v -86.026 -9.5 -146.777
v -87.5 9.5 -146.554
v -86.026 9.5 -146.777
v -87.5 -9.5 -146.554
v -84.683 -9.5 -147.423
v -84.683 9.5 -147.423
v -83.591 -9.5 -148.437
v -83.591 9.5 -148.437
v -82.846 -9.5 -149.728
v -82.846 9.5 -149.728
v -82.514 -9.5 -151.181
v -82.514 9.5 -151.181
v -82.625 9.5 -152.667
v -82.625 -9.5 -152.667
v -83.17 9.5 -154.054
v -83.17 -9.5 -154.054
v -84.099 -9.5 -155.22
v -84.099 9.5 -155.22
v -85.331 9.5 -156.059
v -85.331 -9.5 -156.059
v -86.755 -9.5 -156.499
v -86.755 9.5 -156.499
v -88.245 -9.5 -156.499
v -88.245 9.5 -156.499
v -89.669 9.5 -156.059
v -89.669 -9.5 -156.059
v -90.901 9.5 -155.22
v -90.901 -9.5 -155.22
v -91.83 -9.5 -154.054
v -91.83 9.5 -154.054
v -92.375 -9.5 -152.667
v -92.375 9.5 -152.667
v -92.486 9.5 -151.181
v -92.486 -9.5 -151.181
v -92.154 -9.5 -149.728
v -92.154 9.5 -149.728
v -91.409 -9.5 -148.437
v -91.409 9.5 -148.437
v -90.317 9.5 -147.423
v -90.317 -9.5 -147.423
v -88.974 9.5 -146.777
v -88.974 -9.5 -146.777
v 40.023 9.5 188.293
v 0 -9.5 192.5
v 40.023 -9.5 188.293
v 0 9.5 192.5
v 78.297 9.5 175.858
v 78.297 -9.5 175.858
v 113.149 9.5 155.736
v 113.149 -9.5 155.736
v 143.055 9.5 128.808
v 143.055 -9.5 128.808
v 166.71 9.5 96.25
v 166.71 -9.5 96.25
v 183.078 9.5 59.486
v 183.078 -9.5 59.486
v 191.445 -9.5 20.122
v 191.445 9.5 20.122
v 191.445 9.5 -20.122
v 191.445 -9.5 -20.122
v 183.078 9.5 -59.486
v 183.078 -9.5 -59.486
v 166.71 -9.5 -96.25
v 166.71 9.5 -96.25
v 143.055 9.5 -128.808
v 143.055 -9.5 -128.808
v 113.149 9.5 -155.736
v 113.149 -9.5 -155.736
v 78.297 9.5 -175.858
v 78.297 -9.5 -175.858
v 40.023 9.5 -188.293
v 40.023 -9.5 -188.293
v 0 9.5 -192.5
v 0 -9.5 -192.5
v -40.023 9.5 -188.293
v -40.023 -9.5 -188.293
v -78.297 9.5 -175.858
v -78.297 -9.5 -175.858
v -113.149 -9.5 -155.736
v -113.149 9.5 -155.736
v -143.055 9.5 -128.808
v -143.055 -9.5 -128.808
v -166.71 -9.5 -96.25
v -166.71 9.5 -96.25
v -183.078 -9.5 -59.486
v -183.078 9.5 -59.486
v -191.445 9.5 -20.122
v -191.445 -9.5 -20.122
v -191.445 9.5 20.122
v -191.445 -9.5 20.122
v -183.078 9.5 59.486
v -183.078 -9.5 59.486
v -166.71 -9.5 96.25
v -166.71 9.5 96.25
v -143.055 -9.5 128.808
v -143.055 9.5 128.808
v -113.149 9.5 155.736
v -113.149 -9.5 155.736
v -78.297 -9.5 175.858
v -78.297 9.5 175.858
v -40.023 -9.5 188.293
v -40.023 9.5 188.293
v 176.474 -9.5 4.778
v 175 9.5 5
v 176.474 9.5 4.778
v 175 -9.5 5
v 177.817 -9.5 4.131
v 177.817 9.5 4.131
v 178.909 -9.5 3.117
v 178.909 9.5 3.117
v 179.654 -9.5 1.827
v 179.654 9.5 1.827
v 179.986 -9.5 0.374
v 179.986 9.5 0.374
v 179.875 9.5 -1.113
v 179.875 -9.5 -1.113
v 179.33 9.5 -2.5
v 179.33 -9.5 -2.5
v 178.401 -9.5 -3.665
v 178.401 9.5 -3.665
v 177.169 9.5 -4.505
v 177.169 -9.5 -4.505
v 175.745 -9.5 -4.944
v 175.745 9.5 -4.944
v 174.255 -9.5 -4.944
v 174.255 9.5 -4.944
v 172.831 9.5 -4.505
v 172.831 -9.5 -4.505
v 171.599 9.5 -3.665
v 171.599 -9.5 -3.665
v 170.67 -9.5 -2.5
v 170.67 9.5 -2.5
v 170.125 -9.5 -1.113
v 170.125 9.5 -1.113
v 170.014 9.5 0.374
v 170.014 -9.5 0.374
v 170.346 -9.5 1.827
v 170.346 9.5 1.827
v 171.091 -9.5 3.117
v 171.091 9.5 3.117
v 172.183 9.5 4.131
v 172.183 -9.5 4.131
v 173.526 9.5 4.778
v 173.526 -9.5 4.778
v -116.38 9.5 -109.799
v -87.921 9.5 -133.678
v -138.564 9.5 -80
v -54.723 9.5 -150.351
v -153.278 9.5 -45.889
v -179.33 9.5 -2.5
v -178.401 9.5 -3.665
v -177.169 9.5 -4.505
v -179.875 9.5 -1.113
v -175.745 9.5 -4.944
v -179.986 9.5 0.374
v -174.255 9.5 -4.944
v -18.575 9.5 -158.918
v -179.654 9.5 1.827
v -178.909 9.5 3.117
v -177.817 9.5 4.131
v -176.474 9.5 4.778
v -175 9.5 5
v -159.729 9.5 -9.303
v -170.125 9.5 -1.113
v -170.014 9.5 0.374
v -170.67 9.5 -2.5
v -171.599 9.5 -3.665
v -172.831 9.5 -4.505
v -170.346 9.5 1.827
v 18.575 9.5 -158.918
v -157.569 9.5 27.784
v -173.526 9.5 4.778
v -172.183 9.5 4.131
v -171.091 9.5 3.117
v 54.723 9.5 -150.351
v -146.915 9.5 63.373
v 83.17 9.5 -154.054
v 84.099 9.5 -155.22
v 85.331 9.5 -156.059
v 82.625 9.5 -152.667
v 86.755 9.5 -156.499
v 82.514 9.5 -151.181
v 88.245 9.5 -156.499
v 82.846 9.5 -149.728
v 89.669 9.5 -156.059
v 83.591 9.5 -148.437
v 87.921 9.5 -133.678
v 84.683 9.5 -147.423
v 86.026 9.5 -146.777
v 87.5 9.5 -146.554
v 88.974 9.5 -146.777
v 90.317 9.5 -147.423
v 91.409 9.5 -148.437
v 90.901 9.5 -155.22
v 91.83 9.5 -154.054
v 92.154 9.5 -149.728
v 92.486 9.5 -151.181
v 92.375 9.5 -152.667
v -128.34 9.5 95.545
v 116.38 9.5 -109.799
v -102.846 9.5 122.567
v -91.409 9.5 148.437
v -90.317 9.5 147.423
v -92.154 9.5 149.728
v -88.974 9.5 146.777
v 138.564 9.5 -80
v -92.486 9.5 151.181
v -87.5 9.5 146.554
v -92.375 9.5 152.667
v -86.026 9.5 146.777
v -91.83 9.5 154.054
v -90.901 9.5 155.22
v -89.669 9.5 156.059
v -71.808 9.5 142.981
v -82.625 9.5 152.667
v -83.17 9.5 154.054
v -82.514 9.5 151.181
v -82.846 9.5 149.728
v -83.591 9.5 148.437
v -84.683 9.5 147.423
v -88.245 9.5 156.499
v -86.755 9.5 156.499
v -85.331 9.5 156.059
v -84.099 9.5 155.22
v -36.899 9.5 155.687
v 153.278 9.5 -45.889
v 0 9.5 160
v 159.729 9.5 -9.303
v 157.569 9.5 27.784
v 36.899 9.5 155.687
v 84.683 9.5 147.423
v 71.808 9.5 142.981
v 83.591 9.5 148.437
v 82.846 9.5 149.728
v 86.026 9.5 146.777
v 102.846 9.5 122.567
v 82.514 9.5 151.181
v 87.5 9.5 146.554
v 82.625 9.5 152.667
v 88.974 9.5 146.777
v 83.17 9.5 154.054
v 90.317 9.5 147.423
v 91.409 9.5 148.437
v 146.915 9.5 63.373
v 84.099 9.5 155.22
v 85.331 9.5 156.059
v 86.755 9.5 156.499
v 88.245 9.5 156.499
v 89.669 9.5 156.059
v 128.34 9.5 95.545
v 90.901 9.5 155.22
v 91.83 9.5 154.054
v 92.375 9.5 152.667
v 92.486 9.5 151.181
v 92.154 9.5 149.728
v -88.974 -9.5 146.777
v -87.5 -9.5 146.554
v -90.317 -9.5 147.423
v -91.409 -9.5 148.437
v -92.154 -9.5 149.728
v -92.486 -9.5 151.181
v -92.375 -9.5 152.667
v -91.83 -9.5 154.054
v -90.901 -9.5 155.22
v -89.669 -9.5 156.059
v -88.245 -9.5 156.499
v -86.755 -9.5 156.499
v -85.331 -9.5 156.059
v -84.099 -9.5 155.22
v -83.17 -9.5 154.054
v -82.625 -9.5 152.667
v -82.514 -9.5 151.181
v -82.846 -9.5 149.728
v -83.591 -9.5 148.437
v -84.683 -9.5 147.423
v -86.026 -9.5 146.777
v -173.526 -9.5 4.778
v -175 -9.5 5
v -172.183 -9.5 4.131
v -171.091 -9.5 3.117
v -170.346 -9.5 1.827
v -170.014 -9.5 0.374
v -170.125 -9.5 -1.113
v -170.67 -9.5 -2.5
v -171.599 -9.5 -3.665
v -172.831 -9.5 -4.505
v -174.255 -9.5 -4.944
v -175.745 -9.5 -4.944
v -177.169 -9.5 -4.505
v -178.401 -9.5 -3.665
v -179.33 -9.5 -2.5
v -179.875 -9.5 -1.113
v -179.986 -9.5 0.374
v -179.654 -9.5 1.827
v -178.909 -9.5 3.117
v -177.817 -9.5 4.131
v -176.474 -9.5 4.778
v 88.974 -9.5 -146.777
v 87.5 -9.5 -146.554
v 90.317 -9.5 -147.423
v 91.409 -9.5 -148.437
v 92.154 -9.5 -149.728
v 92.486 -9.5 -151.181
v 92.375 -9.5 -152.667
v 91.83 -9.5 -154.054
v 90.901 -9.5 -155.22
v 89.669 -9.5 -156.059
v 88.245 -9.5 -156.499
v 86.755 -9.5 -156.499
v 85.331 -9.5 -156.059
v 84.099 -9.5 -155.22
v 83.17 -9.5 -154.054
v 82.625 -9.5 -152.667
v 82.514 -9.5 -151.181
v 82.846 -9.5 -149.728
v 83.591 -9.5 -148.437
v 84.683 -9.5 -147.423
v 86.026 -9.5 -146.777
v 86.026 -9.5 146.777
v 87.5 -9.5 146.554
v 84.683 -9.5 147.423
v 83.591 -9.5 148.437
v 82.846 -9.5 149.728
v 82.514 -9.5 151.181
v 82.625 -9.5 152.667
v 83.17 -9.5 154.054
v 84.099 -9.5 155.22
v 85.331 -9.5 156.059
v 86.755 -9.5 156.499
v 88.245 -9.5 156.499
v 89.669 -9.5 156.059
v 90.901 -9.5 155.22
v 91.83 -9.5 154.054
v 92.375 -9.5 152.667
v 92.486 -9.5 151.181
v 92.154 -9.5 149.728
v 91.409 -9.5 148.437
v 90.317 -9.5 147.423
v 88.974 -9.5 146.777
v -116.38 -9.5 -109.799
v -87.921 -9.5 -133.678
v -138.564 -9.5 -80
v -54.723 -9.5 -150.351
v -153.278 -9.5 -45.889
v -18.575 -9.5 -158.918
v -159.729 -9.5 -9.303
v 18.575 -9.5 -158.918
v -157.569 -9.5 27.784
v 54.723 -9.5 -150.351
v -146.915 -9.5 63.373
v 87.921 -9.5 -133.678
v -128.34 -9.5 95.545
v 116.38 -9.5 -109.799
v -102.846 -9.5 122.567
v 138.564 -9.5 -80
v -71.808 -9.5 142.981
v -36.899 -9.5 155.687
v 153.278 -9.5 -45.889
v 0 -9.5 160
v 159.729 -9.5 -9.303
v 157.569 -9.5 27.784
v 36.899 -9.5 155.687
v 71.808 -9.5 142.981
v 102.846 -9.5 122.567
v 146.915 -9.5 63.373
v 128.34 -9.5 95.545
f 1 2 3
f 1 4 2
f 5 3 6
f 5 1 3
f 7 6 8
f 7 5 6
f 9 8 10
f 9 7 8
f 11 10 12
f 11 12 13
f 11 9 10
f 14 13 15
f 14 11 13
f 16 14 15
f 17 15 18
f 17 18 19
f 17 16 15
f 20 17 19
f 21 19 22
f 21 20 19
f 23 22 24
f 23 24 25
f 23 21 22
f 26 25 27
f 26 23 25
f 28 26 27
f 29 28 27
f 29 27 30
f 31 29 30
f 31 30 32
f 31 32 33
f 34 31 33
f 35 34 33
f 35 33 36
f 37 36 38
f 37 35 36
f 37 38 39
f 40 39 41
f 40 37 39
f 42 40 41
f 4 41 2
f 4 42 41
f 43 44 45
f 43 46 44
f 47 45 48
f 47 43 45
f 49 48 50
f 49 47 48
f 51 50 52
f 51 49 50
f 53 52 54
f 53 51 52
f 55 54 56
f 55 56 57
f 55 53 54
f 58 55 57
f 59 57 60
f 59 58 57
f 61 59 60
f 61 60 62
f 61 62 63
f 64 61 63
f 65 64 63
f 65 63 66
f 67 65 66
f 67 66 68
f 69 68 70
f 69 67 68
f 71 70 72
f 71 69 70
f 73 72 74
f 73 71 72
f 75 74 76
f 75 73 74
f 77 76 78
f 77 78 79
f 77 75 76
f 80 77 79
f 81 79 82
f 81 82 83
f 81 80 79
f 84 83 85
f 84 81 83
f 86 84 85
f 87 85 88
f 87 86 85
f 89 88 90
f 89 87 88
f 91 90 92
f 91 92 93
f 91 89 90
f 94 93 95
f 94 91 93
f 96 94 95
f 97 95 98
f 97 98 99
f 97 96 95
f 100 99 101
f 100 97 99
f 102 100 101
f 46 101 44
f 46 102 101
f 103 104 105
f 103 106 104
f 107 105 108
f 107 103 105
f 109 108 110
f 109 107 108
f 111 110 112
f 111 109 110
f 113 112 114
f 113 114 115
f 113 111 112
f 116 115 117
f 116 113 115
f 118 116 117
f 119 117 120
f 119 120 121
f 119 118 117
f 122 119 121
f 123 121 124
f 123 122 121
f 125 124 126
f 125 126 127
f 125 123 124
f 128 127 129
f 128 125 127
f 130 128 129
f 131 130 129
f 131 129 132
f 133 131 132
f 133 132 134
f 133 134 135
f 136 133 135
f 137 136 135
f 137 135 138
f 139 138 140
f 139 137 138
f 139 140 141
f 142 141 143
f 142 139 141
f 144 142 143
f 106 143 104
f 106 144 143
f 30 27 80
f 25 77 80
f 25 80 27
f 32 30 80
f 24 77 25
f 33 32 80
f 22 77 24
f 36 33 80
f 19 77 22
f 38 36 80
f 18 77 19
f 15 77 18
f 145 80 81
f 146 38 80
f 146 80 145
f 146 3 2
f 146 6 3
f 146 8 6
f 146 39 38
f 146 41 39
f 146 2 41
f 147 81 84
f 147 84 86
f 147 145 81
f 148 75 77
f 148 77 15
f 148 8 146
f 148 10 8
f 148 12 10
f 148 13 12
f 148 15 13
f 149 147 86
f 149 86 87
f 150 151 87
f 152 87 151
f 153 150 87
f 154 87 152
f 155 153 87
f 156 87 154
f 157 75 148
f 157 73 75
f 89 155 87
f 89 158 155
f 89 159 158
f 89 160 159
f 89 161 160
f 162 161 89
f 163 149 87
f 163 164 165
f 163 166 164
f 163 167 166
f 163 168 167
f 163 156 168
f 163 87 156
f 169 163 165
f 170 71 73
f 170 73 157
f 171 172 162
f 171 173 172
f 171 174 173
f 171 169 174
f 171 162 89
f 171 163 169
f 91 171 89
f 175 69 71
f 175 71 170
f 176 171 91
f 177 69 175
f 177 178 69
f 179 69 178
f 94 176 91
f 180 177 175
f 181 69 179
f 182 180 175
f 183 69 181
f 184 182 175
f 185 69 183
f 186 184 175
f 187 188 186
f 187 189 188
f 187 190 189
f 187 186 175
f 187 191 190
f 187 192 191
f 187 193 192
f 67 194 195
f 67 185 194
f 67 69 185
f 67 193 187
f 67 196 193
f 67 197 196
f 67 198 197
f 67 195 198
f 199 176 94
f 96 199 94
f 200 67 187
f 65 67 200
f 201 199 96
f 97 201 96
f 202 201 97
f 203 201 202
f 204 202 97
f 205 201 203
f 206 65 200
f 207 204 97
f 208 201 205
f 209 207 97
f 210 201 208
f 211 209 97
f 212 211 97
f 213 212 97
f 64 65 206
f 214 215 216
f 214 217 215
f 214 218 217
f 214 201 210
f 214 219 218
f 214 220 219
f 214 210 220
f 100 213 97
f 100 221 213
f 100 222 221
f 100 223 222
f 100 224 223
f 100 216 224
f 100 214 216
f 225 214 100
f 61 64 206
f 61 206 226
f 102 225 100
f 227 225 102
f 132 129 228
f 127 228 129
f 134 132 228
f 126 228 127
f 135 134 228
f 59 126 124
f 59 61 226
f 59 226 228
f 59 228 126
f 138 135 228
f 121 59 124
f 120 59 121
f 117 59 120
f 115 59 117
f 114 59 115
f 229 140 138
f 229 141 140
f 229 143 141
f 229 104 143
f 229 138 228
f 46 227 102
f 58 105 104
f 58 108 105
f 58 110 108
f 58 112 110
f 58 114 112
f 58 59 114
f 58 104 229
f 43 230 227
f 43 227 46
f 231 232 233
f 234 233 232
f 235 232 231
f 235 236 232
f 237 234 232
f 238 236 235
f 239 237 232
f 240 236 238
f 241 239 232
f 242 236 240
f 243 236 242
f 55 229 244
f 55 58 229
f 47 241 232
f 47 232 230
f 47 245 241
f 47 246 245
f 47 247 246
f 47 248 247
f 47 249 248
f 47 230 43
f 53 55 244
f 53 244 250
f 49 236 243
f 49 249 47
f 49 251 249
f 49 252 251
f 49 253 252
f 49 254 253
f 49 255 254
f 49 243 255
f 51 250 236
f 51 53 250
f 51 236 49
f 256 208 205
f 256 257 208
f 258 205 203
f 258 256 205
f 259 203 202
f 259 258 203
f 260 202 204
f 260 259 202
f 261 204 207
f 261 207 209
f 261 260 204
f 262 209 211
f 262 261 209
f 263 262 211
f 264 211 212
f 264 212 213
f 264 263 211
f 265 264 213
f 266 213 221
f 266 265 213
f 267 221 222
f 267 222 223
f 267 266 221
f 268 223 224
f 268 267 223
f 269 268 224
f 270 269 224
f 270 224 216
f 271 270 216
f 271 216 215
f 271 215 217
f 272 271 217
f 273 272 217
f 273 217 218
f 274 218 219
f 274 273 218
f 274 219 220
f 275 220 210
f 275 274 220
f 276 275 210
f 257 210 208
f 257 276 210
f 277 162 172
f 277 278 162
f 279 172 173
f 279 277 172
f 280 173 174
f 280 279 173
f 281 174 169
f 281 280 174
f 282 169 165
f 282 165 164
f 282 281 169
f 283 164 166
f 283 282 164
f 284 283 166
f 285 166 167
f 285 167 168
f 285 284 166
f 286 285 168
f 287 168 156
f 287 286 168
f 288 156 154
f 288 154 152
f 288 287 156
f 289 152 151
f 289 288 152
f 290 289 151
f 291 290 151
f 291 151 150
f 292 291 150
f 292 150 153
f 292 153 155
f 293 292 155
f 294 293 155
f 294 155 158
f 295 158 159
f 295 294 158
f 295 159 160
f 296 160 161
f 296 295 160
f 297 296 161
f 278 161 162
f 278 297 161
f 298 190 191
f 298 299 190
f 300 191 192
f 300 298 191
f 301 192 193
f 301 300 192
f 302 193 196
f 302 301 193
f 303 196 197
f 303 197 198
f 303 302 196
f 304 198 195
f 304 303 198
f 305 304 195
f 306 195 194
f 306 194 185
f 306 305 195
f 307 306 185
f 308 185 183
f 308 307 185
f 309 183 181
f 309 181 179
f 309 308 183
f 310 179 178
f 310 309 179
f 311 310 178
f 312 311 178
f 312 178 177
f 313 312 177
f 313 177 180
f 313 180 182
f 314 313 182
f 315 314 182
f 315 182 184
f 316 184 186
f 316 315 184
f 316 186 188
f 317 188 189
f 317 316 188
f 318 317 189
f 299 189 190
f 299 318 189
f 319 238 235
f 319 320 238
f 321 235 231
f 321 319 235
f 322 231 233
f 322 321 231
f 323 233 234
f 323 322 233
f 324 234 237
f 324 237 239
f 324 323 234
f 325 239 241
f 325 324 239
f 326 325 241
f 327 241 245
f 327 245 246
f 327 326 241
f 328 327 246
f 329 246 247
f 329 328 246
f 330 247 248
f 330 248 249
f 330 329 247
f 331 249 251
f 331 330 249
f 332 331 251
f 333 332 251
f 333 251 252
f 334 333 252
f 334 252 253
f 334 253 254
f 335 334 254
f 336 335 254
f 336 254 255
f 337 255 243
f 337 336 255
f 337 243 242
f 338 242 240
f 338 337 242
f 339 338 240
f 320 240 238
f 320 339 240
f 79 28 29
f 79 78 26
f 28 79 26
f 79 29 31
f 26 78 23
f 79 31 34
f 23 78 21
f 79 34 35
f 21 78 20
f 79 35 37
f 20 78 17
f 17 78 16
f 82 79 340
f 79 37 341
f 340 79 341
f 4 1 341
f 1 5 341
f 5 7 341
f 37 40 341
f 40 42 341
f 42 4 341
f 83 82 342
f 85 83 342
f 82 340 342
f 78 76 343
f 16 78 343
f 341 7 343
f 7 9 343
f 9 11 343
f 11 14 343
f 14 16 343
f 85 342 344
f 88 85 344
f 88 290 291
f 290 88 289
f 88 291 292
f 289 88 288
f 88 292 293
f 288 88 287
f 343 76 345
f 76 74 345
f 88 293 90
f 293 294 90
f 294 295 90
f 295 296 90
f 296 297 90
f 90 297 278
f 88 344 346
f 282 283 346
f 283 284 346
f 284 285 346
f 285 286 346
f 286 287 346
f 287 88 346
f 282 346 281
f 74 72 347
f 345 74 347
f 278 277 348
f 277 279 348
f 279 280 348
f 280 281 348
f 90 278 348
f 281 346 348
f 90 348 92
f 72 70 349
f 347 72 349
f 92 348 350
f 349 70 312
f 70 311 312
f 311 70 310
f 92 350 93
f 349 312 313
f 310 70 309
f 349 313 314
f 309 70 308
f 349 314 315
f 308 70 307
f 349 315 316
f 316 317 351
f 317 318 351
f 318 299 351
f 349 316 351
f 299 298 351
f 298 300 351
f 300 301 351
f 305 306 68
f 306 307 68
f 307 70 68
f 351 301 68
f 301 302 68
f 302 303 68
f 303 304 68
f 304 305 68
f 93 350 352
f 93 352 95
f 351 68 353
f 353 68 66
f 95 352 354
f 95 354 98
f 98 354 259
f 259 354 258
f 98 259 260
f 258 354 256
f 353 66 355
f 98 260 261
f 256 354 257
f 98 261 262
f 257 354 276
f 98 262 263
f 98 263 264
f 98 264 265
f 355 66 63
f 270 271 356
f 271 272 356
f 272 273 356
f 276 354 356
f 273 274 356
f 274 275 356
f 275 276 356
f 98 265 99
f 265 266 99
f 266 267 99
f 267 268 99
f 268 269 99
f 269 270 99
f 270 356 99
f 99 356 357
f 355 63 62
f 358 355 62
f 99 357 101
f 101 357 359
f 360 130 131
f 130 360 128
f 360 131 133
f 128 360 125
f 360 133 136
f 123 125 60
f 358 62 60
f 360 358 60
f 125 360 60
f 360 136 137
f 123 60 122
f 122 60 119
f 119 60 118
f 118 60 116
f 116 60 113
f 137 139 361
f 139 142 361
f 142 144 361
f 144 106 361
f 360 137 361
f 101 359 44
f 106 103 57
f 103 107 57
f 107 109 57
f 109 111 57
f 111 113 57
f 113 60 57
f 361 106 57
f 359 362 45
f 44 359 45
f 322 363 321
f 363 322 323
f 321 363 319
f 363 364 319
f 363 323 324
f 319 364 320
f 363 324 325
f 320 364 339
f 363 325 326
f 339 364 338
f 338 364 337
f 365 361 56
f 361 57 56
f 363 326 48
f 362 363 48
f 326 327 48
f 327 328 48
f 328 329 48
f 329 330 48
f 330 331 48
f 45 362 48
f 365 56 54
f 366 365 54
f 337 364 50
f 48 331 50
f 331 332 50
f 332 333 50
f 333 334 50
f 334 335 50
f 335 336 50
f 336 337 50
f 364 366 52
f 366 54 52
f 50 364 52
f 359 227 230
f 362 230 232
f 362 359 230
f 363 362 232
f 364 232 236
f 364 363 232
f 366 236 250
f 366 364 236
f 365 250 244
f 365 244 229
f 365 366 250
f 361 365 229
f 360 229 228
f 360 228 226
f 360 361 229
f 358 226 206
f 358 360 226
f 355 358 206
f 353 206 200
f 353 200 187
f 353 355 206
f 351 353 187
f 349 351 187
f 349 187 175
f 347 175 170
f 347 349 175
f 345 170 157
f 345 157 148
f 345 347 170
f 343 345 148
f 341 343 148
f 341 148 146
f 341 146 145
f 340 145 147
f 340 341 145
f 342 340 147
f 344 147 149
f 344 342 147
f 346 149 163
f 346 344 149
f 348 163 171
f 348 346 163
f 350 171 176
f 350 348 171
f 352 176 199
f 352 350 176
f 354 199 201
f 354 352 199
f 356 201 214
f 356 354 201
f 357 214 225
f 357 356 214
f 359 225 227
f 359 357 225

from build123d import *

# Parameters (mm, degrees)
SKETCH1_R           = 192.5
SKETCH1_R_2         = 160
SKETCH1_R_3         = 5
BOSS_EXTRUDE1_DEPTH = 9.5


with BuildPart() as part:
    # Sketch1 → Boss-Extrude1 (new, symmetric)
    with BuildSketch(Plane(origin=(0, 0, 0), x_dir=(1, 0, 0), z_dir=(0, 1, 0))):
        with Locations(Location((0, 0, 0), (0, 0, 270))):
            Circle(SKETCH1_R)
        with Locations(Location((0, 0, 0), (0, 0, 270))):
            Circle(SKETCH1_R_2, mode=Mode.SUBTRACT)
        with Locations(Location((-87.5, 151.554445662, 0), (0, 0, 270))):
            Circle(SKETCH1_R_3, mode=Mode.SUBTRACT)
        with Locations(Location((-175, 0, 0), (0, 0, 270))):
            Circle(SKETCH1_R_3, mode=Mode.SUBTRACT)
        with Locations(Location((87.5, 151.554445662, 0), (0, 0, 270))):
            Circle(SKETCH1_R_3, mode=Mode.SUBTRACT)
        with Locations(Location((175, 0, 0), (0, 0, 270))):
            Circle(SKETCH1_R_3, mode=Mode.SUBTRACT)
        with Locations(Location((87.5, -151.554445662, 0), (0, 0, 90))):
            Circle(SKETCH1_R_3, mode=Mode.SUBTRACT)
        with Locations(Location((-87.5, -151.554445662, 0), (0, 0, 90))):
            Circle(SKETCH1_R_3, mode=Mode.SUBTRACT)
    extrude(amount=BOSS_EXTRUDE1_DEPTH, both=True)


solid = part.part
